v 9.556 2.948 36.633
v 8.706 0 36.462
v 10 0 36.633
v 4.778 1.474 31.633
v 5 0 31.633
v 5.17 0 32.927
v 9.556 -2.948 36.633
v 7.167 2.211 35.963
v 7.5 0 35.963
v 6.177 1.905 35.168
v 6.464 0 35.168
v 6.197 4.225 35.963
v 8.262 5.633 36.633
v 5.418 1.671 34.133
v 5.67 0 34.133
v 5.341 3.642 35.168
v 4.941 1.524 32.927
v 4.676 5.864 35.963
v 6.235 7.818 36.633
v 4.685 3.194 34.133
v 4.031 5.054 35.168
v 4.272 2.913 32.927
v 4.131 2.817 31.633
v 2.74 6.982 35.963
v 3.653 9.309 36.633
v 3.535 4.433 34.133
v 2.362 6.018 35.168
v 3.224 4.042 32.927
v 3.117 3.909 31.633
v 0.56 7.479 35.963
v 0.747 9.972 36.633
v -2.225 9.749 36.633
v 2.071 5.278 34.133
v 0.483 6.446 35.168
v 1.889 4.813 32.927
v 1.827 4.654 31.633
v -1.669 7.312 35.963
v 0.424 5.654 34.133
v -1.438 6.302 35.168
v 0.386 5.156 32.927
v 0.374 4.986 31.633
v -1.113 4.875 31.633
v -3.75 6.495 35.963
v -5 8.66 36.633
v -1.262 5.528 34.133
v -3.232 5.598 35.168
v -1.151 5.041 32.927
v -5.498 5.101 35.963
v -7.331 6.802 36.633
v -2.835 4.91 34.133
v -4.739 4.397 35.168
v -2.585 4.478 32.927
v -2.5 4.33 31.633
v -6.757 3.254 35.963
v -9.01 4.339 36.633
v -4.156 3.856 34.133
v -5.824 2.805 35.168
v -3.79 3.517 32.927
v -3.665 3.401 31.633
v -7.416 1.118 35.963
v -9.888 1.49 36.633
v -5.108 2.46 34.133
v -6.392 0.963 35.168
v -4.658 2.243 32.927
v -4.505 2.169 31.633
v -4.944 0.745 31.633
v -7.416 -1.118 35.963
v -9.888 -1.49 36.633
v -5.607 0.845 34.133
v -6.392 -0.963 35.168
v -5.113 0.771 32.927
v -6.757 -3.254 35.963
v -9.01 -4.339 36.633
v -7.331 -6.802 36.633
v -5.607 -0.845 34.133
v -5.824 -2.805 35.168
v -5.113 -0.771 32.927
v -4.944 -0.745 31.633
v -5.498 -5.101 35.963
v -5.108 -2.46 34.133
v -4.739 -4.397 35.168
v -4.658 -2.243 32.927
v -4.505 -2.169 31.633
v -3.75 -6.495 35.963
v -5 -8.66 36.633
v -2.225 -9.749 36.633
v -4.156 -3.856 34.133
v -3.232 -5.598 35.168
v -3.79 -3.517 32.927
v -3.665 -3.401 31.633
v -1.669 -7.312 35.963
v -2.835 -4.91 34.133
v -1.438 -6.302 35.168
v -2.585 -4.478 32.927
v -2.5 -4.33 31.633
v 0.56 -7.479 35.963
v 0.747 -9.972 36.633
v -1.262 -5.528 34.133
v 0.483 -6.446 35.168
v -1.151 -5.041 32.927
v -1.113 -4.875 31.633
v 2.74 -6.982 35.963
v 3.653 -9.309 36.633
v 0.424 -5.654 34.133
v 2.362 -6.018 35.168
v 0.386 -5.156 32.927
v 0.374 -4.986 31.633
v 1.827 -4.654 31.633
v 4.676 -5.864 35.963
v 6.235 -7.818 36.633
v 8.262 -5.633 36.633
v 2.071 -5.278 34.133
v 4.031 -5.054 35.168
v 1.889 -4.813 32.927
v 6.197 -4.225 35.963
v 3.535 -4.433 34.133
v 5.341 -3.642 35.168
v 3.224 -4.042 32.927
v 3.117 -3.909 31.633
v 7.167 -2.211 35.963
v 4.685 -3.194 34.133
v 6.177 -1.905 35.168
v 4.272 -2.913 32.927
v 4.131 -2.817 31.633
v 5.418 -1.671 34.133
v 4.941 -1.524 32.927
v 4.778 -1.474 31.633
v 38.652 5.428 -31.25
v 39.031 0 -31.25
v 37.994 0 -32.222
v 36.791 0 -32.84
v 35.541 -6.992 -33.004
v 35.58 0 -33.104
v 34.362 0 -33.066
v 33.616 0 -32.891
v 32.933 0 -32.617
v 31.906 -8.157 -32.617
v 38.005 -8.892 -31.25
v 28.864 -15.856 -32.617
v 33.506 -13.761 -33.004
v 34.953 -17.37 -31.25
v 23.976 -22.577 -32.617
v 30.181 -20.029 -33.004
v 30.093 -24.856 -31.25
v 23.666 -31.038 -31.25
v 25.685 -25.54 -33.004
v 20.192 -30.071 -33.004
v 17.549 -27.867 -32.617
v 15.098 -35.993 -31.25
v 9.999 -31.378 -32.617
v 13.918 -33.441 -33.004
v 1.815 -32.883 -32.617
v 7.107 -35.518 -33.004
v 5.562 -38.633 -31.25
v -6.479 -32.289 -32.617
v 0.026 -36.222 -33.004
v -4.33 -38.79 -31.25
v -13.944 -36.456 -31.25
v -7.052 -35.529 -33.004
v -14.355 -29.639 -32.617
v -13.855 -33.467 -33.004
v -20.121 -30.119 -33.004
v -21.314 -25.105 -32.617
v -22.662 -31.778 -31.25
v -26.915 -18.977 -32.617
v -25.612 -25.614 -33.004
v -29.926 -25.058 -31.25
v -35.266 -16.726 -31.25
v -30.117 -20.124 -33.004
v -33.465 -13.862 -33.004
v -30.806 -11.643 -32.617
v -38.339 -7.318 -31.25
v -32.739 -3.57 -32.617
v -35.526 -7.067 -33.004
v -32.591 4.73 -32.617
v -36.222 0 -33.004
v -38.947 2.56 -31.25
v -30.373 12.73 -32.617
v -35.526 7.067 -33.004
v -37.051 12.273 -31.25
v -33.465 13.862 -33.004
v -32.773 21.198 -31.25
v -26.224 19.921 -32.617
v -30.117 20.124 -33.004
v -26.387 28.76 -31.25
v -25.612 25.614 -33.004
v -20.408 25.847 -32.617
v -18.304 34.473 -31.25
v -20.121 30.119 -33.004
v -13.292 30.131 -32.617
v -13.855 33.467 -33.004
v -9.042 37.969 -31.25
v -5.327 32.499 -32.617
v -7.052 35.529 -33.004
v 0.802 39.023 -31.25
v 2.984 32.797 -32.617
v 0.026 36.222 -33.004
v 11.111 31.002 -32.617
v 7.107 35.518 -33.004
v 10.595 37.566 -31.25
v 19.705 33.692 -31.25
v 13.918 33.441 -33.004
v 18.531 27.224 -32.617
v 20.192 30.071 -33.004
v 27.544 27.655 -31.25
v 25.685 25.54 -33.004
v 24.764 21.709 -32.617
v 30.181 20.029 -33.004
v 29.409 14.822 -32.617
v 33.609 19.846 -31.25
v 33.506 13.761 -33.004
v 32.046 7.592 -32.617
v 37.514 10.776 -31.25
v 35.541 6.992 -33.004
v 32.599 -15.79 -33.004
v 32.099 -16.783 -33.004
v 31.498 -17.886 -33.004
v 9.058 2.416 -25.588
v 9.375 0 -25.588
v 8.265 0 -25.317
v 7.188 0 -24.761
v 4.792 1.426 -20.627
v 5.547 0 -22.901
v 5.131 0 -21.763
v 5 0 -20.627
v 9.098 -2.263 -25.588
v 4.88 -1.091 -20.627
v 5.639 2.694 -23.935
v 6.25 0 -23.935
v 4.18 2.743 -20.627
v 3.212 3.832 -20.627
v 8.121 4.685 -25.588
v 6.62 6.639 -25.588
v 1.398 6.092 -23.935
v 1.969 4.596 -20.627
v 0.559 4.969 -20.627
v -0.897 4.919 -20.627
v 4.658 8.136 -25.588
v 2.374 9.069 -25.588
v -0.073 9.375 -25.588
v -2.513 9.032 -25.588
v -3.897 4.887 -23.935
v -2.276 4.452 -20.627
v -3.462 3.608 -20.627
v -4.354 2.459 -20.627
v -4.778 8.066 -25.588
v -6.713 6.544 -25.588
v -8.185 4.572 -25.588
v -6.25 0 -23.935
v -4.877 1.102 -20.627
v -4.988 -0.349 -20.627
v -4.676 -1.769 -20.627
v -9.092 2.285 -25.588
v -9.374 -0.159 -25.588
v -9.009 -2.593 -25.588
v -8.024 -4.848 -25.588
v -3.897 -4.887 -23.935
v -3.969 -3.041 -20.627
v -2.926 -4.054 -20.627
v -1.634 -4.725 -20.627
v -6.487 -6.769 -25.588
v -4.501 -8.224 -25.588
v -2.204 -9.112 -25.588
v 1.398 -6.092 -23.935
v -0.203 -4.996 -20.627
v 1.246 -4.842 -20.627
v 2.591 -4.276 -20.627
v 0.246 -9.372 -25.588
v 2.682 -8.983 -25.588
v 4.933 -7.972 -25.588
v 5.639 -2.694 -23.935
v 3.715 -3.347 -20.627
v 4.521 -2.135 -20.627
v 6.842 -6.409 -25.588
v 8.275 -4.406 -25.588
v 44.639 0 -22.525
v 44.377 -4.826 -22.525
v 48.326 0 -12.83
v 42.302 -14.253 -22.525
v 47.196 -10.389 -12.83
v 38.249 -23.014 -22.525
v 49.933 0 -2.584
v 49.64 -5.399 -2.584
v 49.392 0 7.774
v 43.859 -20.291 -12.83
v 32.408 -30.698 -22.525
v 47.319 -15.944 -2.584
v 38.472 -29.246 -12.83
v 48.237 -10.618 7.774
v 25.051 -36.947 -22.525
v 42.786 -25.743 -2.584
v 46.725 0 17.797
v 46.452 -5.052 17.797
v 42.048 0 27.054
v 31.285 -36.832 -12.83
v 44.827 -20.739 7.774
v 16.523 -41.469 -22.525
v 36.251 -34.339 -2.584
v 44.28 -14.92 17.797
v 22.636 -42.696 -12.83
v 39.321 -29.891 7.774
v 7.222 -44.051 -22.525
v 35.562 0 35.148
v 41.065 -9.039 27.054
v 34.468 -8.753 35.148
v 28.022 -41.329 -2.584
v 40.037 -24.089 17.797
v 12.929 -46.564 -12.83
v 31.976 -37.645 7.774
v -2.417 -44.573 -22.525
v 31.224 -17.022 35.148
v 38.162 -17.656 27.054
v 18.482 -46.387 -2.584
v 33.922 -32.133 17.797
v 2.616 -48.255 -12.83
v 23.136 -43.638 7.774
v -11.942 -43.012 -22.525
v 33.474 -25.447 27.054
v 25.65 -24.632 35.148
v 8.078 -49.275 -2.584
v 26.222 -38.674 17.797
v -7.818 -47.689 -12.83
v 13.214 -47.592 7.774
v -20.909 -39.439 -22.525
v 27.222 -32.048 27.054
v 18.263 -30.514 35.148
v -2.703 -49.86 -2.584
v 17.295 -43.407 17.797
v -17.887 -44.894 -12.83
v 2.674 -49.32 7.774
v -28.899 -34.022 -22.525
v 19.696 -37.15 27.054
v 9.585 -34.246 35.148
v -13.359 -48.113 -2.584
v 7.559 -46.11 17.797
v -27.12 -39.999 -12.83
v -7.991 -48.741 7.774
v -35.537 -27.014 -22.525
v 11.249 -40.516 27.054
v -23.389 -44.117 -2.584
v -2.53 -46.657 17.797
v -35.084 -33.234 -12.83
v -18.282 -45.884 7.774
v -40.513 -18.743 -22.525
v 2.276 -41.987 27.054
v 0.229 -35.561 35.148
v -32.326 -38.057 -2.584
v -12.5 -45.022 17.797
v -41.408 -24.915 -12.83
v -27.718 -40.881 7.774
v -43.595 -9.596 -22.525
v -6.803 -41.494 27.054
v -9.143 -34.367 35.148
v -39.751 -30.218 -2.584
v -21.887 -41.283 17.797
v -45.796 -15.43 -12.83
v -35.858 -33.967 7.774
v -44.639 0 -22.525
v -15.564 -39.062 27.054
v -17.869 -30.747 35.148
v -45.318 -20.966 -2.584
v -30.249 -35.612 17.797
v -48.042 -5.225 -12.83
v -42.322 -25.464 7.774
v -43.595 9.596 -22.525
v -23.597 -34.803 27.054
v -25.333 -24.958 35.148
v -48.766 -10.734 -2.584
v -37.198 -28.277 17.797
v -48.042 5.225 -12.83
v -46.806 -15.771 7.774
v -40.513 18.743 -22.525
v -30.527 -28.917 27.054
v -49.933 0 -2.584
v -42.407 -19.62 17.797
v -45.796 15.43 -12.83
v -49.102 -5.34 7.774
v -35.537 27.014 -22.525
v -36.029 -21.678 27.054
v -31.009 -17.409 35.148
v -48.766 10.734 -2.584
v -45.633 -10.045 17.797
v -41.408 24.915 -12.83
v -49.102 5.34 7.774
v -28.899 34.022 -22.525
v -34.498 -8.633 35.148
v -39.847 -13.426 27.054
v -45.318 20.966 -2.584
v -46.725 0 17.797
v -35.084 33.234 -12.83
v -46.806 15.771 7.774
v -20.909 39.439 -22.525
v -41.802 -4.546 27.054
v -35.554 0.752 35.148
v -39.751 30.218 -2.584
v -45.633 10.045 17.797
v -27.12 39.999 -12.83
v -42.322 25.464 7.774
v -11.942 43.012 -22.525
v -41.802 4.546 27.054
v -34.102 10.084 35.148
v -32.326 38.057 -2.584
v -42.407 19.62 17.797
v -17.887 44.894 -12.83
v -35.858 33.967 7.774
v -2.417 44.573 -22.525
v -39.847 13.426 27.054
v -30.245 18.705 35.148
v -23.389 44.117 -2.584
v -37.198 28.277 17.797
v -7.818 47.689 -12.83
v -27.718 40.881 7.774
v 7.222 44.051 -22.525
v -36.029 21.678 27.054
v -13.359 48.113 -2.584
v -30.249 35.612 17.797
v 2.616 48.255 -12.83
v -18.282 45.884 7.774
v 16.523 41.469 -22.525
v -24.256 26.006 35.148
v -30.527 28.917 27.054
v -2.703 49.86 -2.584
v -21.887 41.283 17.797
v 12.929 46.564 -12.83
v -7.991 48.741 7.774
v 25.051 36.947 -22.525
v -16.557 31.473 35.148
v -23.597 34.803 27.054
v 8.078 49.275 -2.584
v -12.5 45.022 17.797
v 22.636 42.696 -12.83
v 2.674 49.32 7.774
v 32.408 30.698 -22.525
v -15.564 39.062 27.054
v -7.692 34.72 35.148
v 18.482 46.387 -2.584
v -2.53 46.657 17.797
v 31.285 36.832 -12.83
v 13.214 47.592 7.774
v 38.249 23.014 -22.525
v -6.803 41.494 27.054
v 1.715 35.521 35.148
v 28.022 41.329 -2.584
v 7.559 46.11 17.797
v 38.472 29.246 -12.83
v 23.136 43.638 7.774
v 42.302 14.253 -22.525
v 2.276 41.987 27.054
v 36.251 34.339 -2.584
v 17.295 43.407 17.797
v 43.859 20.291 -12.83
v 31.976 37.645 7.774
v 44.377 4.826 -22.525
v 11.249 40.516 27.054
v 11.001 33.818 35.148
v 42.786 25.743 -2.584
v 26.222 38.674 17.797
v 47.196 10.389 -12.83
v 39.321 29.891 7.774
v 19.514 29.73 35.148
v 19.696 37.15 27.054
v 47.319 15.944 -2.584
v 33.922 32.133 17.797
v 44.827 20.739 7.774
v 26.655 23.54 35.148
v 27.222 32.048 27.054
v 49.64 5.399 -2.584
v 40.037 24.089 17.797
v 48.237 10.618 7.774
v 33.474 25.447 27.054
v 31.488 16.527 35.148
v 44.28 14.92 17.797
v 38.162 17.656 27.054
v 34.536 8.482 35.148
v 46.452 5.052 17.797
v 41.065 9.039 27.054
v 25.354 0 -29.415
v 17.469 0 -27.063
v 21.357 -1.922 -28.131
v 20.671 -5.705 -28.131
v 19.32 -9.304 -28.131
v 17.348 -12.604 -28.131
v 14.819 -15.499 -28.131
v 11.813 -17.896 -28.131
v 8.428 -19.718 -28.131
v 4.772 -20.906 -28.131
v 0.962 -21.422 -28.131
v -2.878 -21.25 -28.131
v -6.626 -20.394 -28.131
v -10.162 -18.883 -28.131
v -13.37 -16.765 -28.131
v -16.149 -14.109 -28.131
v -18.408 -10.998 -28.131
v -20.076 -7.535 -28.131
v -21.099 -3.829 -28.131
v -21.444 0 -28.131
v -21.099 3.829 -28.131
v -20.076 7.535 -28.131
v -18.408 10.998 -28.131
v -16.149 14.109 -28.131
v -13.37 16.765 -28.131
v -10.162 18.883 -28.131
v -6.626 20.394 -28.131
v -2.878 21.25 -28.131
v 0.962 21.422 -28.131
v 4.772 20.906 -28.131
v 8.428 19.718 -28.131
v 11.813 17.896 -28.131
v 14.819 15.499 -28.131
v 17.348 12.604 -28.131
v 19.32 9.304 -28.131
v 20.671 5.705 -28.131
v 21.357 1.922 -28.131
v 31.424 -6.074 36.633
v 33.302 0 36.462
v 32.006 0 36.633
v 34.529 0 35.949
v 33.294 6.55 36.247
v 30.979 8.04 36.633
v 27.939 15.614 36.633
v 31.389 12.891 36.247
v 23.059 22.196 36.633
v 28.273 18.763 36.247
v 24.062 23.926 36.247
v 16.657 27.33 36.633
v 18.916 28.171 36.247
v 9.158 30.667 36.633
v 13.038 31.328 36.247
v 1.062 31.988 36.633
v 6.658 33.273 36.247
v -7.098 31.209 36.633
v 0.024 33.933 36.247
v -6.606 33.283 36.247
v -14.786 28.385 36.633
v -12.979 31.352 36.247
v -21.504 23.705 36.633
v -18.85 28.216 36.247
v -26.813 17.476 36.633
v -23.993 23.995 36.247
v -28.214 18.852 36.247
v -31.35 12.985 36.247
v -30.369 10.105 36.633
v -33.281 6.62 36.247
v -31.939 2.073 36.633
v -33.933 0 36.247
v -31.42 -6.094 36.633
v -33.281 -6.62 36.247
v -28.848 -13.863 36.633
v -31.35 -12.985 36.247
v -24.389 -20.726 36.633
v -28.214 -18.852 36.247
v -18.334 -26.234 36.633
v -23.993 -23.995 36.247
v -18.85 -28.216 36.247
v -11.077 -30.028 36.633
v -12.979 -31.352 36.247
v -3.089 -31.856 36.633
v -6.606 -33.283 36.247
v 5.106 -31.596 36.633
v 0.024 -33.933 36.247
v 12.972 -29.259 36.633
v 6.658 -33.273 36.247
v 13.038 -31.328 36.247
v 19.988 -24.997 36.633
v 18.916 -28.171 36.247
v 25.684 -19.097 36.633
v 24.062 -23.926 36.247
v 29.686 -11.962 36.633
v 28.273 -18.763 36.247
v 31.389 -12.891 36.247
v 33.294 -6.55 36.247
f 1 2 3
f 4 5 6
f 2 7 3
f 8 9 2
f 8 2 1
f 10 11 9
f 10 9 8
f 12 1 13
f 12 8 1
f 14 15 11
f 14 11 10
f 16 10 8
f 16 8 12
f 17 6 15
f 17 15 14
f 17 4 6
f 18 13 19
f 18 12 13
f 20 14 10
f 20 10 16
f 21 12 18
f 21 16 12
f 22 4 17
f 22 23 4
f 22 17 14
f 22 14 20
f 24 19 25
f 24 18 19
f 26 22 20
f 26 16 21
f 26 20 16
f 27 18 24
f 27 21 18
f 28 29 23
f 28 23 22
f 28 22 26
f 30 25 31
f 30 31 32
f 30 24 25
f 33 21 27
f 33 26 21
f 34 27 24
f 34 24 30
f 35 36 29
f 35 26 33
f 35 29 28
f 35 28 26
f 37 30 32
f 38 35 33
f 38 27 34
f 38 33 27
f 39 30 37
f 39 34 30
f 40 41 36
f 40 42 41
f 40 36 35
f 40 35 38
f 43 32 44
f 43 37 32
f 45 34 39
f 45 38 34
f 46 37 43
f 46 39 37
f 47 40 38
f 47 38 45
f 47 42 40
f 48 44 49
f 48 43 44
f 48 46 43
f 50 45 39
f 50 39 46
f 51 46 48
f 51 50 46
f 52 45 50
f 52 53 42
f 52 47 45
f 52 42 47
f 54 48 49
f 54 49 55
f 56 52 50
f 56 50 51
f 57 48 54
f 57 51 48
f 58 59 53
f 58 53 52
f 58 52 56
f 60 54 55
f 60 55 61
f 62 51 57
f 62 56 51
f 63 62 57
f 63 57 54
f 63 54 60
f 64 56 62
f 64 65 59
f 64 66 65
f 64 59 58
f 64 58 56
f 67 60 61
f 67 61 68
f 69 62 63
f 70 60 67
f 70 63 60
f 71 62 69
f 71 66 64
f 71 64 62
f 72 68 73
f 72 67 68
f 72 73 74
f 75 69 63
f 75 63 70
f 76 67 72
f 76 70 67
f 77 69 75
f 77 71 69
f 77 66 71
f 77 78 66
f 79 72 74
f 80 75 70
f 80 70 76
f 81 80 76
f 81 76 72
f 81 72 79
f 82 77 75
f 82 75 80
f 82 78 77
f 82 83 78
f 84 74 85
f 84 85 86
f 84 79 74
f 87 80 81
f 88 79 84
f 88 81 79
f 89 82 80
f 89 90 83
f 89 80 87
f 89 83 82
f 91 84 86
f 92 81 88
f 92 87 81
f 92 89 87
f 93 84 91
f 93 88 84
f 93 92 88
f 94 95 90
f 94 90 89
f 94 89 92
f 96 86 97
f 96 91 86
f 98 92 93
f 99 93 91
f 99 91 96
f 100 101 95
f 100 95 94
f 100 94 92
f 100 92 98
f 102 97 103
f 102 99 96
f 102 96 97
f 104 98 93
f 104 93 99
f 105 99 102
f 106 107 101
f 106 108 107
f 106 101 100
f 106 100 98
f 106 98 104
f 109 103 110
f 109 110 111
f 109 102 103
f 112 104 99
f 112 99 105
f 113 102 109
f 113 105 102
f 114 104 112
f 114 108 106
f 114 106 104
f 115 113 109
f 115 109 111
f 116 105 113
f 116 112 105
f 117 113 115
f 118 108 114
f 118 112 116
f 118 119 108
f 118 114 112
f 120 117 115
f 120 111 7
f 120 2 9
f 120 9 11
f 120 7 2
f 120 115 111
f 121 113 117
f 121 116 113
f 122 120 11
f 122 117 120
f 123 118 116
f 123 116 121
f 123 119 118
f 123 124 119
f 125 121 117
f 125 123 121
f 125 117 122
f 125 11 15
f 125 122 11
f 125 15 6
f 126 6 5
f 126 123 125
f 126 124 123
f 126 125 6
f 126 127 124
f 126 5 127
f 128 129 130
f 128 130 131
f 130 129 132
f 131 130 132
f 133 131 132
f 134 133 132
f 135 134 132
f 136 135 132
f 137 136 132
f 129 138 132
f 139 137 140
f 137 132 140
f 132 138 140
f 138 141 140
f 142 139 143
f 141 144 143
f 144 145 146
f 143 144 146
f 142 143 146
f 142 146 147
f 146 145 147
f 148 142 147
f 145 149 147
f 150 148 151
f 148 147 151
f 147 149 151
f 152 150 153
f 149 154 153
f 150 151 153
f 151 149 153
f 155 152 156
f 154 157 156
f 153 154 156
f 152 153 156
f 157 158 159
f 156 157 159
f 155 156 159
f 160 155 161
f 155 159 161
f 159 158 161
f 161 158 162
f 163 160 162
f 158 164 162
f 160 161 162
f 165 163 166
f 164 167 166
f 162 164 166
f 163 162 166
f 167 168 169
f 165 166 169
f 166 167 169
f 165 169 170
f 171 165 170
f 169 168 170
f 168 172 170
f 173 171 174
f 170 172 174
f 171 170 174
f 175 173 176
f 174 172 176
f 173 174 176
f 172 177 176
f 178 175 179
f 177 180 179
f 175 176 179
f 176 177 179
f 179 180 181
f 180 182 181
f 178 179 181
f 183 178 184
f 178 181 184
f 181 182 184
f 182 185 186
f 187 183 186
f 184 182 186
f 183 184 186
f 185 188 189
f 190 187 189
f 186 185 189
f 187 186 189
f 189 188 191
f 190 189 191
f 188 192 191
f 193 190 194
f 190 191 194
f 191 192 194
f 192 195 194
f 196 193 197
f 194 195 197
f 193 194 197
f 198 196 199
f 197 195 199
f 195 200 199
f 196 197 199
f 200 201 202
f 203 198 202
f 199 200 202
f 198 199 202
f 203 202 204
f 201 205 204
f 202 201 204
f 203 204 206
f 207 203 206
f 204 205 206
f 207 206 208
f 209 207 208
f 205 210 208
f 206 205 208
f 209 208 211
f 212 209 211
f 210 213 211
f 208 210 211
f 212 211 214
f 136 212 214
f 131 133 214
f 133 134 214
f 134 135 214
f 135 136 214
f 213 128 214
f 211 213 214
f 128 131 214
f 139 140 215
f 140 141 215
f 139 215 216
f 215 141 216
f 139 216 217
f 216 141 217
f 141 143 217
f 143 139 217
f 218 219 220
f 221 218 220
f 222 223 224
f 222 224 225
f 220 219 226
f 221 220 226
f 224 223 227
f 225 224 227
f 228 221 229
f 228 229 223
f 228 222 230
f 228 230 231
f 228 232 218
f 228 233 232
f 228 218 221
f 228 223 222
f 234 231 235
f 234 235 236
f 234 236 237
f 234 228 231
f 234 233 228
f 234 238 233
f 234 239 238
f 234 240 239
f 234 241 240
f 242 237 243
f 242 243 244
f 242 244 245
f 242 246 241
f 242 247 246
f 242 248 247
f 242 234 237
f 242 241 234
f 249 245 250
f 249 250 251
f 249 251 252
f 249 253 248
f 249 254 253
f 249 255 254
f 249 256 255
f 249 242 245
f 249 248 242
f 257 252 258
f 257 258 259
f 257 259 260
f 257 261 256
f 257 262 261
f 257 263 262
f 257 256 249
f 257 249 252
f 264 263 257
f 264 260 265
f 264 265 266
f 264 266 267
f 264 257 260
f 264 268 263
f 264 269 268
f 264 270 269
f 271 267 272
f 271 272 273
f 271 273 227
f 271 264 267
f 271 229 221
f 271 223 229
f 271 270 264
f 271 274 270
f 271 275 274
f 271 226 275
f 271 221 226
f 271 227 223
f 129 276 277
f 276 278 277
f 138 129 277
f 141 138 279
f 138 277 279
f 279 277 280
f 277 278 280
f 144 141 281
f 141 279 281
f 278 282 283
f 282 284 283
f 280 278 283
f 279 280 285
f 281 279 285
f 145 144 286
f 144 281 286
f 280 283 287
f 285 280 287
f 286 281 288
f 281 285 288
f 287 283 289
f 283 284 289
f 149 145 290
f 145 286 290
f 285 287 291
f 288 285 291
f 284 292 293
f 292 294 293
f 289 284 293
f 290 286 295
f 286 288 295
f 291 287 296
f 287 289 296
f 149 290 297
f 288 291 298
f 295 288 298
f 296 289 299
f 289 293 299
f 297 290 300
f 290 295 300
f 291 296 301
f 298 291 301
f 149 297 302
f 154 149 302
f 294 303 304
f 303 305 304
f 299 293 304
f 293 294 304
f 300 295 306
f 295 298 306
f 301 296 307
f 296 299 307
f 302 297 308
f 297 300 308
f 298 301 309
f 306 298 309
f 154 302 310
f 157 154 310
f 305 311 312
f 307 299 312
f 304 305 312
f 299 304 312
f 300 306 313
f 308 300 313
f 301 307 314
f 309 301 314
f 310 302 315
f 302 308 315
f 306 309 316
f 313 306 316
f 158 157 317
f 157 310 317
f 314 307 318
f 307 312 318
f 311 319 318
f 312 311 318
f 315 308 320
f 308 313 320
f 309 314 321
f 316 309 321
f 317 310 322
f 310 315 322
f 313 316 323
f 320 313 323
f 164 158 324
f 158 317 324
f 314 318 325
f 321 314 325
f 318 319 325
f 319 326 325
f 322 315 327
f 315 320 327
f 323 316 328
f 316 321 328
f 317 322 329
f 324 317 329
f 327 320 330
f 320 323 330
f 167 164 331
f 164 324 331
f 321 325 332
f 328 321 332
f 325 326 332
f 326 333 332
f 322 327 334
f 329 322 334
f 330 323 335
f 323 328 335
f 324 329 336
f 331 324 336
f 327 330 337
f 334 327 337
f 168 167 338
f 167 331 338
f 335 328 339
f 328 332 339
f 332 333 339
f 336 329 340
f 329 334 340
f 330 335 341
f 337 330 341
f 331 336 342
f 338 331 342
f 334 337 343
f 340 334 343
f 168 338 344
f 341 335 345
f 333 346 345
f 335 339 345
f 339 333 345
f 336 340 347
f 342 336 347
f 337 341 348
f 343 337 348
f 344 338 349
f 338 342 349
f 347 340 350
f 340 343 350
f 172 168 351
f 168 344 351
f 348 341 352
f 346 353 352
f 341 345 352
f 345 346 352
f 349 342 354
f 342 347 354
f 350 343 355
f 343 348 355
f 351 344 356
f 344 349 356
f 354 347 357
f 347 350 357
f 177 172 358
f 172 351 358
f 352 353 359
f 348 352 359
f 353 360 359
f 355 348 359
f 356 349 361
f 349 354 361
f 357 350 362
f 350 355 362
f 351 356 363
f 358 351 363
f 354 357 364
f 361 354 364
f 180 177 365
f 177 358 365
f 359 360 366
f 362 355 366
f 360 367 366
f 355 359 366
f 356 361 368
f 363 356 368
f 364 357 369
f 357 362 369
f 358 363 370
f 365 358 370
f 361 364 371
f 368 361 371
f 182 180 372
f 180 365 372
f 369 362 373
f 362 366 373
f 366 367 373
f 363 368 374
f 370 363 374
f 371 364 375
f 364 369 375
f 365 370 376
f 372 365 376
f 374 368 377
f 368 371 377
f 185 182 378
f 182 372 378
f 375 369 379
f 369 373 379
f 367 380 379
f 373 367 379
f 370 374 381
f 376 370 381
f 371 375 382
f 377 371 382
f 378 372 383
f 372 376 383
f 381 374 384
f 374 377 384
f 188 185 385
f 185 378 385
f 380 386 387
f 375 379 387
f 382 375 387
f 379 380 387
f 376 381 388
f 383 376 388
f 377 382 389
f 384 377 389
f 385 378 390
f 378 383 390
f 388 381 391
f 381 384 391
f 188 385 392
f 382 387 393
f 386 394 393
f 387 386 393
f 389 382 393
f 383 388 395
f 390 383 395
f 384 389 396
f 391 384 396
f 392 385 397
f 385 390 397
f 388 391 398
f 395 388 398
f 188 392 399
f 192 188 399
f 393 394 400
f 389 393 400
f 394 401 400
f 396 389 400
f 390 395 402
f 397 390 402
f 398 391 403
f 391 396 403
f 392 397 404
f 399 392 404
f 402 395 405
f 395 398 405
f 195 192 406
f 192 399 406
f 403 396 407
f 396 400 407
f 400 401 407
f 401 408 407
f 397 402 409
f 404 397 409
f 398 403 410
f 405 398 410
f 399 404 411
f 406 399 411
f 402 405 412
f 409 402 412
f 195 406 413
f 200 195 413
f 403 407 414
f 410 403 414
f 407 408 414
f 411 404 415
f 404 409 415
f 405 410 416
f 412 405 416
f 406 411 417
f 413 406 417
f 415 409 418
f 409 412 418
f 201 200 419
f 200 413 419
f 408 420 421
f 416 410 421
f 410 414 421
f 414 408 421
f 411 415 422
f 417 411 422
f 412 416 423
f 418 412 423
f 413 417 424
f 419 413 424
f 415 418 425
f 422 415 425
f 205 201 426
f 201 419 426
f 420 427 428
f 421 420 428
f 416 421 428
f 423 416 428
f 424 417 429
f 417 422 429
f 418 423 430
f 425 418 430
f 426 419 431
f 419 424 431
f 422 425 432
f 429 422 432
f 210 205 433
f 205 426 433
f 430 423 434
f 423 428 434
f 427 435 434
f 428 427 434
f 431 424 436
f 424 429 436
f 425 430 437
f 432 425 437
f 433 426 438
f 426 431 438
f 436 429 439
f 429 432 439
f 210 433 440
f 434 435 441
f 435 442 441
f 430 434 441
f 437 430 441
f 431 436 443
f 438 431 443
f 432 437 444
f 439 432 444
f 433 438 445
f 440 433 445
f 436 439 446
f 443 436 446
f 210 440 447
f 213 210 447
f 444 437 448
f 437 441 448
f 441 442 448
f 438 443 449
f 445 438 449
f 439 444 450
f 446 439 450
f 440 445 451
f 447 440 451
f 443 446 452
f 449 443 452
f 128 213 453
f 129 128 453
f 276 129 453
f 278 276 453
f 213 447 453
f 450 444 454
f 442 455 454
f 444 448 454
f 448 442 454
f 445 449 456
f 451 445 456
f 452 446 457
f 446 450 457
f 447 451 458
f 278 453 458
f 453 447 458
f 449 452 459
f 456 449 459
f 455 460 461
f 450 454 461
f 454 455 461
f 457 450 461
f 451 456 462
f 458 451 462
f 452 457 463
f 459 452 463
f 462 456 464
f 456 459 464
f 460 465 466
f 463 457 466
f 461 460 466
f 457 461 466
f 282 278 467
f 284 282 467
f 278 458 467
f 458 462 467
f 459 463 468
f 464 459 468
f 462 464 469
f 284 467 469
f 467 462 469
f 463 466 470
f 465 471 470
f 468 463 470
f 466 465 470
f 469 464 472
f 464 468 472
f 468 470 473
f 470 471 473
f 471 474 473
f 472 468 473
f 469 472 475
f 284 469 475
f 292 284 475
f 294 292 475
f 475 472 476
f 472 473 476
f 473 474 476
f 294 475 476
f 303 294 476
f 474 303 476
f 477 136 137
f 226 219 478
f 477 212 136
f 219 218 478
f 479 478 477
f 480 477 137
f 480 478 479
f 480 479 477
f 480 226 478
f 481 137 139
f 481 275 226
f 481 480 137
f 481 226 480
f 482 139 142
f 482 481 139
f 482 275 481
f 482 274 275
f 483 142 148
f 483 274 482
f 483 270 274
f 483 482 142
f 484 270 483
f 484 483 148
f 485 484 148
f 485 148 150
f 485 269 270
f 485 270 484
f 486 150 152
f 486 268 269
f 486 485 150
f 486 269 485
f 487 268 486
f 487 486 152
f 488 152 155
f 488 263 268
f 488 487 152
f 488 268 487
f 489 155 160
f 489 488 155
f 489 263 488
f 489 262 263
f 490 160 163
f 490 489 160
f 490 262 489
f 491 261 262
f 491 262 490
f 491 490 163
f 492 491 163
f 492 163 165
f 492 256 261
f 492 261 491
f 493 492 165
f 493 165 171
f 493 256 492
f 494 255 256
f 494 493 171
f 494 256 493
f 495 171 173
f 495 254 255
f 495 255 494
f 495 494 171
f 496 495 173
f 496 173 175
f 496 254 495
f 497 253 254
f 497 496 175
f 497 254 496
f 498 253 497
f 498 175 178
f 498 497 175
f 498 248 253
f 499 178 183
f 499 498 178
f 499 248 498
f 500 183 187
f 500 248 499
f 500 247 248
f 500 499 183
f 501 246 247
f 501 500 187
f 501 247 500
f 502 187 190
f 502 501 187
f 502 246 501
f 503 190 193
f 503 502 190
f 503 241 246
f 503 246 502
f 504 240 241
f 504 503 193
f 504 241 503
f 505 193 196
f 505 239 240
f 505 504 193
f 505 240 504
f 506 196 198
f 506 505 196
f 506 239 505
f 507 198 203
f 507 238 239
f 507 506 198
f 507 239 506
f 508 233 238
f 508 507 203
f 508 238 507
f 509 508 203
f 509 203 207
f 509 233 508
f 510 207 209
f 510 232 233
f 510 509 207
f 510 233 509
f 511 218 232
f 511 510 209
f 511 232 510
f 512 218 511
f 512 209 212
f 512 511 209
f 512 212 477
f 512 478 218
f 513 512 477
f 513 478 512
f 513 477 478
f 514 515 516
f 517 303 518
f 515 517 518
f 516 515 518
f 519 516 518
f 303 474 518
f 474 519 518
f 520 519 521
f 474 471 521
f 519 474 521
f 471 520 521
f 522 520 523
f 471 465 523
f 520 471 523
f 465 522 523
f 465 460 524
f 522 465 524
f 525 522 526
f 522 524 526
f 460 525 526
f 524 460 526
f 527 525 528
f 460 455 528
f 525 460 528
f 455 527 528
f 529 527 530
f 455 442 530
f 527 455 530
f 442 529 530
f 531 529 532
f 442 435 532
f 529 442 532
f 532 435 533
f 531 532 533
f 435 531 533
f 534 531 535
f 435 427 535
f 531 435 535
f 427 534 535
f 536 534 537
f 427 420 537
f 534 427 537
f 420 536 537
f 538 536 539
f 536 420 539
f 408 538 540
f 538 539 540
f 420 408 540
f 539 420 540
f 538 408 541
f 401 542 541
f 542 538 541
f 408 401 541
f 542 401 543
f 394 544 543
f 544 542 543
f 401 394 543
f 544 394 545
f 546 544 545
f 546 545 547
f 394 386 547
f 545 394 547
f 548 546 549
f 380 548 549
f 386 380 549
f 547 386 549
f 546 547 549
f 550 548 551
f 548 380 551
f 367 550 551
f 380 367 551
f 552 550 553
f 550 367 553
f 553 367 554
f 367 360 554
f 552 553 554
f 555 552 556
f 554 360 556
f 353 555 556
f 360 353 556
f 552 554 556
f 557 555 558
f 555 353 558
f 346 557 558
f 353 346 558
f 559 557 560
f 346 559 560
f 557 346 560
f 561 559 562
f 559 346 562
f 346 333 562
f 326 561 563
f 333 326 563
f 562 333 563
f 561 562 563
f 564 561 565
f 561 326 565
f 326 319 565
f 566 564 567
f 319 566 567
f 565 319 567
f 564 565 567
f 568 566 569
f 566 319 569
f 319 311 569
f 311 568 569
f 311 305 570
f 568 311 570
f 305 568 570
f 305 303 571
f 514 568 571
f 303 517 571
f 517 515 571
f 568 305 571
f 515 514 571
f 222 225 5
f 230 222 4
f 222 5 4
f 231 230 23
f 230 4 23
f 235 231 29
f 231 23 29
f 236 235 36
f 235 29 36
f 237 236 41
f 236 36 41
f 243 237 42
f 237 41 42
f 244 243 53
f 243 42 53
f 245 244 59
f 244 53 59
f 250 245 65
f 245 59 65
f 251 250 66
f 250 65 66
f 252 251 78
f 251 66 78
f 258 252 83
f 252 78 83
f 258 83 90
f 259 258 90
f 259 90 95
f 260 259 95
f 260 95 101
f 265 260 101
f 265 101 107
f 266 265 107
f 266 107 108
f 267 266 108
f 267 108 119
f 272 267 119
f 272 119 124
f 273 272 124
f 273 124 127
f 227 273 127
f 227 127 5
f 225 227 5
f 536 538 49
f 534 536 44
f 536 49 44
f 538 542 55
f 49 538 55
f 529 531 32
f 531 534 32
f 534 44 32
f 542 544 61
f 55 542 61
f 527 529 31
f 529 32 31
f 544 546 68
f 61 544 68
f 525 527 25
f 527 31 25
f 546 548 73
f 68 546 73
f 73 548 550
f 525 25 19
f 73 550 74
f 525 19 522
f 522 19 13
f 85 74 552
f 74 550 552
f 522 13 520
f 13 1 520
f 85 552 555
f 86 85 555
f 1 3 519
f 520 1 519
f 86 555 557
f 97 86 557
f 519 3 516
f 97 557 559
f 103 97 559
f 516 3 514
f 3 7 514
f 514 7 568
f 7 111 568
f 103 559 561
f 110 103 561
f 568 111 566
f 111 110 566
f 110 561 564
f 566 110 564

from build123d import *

# Parameters (mm, degrees)
F2_W     = 100
F2_H     = 20
F3_DEPTH = 40
F6_R     = 5
F7_DEPTH = 71.0088039765
F8_R     = 5
F9_R     = 5


with BuildPart() as f1:
    # F0 (on Front) → F1 (revolve)
    with BuildSketch(Plane.XZ):
        with BuildLine():
            Line((0, 50), (0, -50))
            ThreePointArc((0, -50), (50, 0), (0, 50))
        make_face()
    revolve(axis=Axis((0, 0, -1.8287375569), (0, 0, -1)))

    # F2 (on Front) → F3 (cut, symmetric)
    with BuildSketch(Plane.XZ):
        with Locations((0, 46.6328039765)):
            Rectangle(F2_W, F2_H)
    extrude(amount=F3_DEPTH, both=True, mode=Mode.SUBTRACT)

    # F4 (on Front) → F5 (revolve, cut)
    with BuildSketch(Plane.XZ):
        with BuildLine():
            Line((0, -25), (0, -175))
            ThreePointArc((0, -175), (75, -100), (0, -25))
        make_face()
    revolve(axis=Axis((0, 0, -99.9178830534), (0, 0, -1)), mode=Mode.SUBTRACT)

    # F6 (on face) → F7 (cut, through all)
    with BuildSketch(Plane.XY.offset(36.6328039765)):
        Circle(F6_R)
    extrude(amount=-F7_DEPTH, mode=Mode.SUBTRACT)

    # F8
    f8_edges = [f1.edges().sort_by_distance(p)[0] for p in [
        (-34.029953, 0, 36.632804),
    ]]
    fillet(f8_edges, radius=F8_R)

    # F9
    f9_edges = [f1.edges().sort_by_distance(p)[0] for p in [
        (-5, 0, 36.632804),
        (-36.309219, 0, -34.375),
        (-5, 0, -25.166852),
    ]]
    fillet(f9_edges, radius=F9_R)


solid = f1.part
